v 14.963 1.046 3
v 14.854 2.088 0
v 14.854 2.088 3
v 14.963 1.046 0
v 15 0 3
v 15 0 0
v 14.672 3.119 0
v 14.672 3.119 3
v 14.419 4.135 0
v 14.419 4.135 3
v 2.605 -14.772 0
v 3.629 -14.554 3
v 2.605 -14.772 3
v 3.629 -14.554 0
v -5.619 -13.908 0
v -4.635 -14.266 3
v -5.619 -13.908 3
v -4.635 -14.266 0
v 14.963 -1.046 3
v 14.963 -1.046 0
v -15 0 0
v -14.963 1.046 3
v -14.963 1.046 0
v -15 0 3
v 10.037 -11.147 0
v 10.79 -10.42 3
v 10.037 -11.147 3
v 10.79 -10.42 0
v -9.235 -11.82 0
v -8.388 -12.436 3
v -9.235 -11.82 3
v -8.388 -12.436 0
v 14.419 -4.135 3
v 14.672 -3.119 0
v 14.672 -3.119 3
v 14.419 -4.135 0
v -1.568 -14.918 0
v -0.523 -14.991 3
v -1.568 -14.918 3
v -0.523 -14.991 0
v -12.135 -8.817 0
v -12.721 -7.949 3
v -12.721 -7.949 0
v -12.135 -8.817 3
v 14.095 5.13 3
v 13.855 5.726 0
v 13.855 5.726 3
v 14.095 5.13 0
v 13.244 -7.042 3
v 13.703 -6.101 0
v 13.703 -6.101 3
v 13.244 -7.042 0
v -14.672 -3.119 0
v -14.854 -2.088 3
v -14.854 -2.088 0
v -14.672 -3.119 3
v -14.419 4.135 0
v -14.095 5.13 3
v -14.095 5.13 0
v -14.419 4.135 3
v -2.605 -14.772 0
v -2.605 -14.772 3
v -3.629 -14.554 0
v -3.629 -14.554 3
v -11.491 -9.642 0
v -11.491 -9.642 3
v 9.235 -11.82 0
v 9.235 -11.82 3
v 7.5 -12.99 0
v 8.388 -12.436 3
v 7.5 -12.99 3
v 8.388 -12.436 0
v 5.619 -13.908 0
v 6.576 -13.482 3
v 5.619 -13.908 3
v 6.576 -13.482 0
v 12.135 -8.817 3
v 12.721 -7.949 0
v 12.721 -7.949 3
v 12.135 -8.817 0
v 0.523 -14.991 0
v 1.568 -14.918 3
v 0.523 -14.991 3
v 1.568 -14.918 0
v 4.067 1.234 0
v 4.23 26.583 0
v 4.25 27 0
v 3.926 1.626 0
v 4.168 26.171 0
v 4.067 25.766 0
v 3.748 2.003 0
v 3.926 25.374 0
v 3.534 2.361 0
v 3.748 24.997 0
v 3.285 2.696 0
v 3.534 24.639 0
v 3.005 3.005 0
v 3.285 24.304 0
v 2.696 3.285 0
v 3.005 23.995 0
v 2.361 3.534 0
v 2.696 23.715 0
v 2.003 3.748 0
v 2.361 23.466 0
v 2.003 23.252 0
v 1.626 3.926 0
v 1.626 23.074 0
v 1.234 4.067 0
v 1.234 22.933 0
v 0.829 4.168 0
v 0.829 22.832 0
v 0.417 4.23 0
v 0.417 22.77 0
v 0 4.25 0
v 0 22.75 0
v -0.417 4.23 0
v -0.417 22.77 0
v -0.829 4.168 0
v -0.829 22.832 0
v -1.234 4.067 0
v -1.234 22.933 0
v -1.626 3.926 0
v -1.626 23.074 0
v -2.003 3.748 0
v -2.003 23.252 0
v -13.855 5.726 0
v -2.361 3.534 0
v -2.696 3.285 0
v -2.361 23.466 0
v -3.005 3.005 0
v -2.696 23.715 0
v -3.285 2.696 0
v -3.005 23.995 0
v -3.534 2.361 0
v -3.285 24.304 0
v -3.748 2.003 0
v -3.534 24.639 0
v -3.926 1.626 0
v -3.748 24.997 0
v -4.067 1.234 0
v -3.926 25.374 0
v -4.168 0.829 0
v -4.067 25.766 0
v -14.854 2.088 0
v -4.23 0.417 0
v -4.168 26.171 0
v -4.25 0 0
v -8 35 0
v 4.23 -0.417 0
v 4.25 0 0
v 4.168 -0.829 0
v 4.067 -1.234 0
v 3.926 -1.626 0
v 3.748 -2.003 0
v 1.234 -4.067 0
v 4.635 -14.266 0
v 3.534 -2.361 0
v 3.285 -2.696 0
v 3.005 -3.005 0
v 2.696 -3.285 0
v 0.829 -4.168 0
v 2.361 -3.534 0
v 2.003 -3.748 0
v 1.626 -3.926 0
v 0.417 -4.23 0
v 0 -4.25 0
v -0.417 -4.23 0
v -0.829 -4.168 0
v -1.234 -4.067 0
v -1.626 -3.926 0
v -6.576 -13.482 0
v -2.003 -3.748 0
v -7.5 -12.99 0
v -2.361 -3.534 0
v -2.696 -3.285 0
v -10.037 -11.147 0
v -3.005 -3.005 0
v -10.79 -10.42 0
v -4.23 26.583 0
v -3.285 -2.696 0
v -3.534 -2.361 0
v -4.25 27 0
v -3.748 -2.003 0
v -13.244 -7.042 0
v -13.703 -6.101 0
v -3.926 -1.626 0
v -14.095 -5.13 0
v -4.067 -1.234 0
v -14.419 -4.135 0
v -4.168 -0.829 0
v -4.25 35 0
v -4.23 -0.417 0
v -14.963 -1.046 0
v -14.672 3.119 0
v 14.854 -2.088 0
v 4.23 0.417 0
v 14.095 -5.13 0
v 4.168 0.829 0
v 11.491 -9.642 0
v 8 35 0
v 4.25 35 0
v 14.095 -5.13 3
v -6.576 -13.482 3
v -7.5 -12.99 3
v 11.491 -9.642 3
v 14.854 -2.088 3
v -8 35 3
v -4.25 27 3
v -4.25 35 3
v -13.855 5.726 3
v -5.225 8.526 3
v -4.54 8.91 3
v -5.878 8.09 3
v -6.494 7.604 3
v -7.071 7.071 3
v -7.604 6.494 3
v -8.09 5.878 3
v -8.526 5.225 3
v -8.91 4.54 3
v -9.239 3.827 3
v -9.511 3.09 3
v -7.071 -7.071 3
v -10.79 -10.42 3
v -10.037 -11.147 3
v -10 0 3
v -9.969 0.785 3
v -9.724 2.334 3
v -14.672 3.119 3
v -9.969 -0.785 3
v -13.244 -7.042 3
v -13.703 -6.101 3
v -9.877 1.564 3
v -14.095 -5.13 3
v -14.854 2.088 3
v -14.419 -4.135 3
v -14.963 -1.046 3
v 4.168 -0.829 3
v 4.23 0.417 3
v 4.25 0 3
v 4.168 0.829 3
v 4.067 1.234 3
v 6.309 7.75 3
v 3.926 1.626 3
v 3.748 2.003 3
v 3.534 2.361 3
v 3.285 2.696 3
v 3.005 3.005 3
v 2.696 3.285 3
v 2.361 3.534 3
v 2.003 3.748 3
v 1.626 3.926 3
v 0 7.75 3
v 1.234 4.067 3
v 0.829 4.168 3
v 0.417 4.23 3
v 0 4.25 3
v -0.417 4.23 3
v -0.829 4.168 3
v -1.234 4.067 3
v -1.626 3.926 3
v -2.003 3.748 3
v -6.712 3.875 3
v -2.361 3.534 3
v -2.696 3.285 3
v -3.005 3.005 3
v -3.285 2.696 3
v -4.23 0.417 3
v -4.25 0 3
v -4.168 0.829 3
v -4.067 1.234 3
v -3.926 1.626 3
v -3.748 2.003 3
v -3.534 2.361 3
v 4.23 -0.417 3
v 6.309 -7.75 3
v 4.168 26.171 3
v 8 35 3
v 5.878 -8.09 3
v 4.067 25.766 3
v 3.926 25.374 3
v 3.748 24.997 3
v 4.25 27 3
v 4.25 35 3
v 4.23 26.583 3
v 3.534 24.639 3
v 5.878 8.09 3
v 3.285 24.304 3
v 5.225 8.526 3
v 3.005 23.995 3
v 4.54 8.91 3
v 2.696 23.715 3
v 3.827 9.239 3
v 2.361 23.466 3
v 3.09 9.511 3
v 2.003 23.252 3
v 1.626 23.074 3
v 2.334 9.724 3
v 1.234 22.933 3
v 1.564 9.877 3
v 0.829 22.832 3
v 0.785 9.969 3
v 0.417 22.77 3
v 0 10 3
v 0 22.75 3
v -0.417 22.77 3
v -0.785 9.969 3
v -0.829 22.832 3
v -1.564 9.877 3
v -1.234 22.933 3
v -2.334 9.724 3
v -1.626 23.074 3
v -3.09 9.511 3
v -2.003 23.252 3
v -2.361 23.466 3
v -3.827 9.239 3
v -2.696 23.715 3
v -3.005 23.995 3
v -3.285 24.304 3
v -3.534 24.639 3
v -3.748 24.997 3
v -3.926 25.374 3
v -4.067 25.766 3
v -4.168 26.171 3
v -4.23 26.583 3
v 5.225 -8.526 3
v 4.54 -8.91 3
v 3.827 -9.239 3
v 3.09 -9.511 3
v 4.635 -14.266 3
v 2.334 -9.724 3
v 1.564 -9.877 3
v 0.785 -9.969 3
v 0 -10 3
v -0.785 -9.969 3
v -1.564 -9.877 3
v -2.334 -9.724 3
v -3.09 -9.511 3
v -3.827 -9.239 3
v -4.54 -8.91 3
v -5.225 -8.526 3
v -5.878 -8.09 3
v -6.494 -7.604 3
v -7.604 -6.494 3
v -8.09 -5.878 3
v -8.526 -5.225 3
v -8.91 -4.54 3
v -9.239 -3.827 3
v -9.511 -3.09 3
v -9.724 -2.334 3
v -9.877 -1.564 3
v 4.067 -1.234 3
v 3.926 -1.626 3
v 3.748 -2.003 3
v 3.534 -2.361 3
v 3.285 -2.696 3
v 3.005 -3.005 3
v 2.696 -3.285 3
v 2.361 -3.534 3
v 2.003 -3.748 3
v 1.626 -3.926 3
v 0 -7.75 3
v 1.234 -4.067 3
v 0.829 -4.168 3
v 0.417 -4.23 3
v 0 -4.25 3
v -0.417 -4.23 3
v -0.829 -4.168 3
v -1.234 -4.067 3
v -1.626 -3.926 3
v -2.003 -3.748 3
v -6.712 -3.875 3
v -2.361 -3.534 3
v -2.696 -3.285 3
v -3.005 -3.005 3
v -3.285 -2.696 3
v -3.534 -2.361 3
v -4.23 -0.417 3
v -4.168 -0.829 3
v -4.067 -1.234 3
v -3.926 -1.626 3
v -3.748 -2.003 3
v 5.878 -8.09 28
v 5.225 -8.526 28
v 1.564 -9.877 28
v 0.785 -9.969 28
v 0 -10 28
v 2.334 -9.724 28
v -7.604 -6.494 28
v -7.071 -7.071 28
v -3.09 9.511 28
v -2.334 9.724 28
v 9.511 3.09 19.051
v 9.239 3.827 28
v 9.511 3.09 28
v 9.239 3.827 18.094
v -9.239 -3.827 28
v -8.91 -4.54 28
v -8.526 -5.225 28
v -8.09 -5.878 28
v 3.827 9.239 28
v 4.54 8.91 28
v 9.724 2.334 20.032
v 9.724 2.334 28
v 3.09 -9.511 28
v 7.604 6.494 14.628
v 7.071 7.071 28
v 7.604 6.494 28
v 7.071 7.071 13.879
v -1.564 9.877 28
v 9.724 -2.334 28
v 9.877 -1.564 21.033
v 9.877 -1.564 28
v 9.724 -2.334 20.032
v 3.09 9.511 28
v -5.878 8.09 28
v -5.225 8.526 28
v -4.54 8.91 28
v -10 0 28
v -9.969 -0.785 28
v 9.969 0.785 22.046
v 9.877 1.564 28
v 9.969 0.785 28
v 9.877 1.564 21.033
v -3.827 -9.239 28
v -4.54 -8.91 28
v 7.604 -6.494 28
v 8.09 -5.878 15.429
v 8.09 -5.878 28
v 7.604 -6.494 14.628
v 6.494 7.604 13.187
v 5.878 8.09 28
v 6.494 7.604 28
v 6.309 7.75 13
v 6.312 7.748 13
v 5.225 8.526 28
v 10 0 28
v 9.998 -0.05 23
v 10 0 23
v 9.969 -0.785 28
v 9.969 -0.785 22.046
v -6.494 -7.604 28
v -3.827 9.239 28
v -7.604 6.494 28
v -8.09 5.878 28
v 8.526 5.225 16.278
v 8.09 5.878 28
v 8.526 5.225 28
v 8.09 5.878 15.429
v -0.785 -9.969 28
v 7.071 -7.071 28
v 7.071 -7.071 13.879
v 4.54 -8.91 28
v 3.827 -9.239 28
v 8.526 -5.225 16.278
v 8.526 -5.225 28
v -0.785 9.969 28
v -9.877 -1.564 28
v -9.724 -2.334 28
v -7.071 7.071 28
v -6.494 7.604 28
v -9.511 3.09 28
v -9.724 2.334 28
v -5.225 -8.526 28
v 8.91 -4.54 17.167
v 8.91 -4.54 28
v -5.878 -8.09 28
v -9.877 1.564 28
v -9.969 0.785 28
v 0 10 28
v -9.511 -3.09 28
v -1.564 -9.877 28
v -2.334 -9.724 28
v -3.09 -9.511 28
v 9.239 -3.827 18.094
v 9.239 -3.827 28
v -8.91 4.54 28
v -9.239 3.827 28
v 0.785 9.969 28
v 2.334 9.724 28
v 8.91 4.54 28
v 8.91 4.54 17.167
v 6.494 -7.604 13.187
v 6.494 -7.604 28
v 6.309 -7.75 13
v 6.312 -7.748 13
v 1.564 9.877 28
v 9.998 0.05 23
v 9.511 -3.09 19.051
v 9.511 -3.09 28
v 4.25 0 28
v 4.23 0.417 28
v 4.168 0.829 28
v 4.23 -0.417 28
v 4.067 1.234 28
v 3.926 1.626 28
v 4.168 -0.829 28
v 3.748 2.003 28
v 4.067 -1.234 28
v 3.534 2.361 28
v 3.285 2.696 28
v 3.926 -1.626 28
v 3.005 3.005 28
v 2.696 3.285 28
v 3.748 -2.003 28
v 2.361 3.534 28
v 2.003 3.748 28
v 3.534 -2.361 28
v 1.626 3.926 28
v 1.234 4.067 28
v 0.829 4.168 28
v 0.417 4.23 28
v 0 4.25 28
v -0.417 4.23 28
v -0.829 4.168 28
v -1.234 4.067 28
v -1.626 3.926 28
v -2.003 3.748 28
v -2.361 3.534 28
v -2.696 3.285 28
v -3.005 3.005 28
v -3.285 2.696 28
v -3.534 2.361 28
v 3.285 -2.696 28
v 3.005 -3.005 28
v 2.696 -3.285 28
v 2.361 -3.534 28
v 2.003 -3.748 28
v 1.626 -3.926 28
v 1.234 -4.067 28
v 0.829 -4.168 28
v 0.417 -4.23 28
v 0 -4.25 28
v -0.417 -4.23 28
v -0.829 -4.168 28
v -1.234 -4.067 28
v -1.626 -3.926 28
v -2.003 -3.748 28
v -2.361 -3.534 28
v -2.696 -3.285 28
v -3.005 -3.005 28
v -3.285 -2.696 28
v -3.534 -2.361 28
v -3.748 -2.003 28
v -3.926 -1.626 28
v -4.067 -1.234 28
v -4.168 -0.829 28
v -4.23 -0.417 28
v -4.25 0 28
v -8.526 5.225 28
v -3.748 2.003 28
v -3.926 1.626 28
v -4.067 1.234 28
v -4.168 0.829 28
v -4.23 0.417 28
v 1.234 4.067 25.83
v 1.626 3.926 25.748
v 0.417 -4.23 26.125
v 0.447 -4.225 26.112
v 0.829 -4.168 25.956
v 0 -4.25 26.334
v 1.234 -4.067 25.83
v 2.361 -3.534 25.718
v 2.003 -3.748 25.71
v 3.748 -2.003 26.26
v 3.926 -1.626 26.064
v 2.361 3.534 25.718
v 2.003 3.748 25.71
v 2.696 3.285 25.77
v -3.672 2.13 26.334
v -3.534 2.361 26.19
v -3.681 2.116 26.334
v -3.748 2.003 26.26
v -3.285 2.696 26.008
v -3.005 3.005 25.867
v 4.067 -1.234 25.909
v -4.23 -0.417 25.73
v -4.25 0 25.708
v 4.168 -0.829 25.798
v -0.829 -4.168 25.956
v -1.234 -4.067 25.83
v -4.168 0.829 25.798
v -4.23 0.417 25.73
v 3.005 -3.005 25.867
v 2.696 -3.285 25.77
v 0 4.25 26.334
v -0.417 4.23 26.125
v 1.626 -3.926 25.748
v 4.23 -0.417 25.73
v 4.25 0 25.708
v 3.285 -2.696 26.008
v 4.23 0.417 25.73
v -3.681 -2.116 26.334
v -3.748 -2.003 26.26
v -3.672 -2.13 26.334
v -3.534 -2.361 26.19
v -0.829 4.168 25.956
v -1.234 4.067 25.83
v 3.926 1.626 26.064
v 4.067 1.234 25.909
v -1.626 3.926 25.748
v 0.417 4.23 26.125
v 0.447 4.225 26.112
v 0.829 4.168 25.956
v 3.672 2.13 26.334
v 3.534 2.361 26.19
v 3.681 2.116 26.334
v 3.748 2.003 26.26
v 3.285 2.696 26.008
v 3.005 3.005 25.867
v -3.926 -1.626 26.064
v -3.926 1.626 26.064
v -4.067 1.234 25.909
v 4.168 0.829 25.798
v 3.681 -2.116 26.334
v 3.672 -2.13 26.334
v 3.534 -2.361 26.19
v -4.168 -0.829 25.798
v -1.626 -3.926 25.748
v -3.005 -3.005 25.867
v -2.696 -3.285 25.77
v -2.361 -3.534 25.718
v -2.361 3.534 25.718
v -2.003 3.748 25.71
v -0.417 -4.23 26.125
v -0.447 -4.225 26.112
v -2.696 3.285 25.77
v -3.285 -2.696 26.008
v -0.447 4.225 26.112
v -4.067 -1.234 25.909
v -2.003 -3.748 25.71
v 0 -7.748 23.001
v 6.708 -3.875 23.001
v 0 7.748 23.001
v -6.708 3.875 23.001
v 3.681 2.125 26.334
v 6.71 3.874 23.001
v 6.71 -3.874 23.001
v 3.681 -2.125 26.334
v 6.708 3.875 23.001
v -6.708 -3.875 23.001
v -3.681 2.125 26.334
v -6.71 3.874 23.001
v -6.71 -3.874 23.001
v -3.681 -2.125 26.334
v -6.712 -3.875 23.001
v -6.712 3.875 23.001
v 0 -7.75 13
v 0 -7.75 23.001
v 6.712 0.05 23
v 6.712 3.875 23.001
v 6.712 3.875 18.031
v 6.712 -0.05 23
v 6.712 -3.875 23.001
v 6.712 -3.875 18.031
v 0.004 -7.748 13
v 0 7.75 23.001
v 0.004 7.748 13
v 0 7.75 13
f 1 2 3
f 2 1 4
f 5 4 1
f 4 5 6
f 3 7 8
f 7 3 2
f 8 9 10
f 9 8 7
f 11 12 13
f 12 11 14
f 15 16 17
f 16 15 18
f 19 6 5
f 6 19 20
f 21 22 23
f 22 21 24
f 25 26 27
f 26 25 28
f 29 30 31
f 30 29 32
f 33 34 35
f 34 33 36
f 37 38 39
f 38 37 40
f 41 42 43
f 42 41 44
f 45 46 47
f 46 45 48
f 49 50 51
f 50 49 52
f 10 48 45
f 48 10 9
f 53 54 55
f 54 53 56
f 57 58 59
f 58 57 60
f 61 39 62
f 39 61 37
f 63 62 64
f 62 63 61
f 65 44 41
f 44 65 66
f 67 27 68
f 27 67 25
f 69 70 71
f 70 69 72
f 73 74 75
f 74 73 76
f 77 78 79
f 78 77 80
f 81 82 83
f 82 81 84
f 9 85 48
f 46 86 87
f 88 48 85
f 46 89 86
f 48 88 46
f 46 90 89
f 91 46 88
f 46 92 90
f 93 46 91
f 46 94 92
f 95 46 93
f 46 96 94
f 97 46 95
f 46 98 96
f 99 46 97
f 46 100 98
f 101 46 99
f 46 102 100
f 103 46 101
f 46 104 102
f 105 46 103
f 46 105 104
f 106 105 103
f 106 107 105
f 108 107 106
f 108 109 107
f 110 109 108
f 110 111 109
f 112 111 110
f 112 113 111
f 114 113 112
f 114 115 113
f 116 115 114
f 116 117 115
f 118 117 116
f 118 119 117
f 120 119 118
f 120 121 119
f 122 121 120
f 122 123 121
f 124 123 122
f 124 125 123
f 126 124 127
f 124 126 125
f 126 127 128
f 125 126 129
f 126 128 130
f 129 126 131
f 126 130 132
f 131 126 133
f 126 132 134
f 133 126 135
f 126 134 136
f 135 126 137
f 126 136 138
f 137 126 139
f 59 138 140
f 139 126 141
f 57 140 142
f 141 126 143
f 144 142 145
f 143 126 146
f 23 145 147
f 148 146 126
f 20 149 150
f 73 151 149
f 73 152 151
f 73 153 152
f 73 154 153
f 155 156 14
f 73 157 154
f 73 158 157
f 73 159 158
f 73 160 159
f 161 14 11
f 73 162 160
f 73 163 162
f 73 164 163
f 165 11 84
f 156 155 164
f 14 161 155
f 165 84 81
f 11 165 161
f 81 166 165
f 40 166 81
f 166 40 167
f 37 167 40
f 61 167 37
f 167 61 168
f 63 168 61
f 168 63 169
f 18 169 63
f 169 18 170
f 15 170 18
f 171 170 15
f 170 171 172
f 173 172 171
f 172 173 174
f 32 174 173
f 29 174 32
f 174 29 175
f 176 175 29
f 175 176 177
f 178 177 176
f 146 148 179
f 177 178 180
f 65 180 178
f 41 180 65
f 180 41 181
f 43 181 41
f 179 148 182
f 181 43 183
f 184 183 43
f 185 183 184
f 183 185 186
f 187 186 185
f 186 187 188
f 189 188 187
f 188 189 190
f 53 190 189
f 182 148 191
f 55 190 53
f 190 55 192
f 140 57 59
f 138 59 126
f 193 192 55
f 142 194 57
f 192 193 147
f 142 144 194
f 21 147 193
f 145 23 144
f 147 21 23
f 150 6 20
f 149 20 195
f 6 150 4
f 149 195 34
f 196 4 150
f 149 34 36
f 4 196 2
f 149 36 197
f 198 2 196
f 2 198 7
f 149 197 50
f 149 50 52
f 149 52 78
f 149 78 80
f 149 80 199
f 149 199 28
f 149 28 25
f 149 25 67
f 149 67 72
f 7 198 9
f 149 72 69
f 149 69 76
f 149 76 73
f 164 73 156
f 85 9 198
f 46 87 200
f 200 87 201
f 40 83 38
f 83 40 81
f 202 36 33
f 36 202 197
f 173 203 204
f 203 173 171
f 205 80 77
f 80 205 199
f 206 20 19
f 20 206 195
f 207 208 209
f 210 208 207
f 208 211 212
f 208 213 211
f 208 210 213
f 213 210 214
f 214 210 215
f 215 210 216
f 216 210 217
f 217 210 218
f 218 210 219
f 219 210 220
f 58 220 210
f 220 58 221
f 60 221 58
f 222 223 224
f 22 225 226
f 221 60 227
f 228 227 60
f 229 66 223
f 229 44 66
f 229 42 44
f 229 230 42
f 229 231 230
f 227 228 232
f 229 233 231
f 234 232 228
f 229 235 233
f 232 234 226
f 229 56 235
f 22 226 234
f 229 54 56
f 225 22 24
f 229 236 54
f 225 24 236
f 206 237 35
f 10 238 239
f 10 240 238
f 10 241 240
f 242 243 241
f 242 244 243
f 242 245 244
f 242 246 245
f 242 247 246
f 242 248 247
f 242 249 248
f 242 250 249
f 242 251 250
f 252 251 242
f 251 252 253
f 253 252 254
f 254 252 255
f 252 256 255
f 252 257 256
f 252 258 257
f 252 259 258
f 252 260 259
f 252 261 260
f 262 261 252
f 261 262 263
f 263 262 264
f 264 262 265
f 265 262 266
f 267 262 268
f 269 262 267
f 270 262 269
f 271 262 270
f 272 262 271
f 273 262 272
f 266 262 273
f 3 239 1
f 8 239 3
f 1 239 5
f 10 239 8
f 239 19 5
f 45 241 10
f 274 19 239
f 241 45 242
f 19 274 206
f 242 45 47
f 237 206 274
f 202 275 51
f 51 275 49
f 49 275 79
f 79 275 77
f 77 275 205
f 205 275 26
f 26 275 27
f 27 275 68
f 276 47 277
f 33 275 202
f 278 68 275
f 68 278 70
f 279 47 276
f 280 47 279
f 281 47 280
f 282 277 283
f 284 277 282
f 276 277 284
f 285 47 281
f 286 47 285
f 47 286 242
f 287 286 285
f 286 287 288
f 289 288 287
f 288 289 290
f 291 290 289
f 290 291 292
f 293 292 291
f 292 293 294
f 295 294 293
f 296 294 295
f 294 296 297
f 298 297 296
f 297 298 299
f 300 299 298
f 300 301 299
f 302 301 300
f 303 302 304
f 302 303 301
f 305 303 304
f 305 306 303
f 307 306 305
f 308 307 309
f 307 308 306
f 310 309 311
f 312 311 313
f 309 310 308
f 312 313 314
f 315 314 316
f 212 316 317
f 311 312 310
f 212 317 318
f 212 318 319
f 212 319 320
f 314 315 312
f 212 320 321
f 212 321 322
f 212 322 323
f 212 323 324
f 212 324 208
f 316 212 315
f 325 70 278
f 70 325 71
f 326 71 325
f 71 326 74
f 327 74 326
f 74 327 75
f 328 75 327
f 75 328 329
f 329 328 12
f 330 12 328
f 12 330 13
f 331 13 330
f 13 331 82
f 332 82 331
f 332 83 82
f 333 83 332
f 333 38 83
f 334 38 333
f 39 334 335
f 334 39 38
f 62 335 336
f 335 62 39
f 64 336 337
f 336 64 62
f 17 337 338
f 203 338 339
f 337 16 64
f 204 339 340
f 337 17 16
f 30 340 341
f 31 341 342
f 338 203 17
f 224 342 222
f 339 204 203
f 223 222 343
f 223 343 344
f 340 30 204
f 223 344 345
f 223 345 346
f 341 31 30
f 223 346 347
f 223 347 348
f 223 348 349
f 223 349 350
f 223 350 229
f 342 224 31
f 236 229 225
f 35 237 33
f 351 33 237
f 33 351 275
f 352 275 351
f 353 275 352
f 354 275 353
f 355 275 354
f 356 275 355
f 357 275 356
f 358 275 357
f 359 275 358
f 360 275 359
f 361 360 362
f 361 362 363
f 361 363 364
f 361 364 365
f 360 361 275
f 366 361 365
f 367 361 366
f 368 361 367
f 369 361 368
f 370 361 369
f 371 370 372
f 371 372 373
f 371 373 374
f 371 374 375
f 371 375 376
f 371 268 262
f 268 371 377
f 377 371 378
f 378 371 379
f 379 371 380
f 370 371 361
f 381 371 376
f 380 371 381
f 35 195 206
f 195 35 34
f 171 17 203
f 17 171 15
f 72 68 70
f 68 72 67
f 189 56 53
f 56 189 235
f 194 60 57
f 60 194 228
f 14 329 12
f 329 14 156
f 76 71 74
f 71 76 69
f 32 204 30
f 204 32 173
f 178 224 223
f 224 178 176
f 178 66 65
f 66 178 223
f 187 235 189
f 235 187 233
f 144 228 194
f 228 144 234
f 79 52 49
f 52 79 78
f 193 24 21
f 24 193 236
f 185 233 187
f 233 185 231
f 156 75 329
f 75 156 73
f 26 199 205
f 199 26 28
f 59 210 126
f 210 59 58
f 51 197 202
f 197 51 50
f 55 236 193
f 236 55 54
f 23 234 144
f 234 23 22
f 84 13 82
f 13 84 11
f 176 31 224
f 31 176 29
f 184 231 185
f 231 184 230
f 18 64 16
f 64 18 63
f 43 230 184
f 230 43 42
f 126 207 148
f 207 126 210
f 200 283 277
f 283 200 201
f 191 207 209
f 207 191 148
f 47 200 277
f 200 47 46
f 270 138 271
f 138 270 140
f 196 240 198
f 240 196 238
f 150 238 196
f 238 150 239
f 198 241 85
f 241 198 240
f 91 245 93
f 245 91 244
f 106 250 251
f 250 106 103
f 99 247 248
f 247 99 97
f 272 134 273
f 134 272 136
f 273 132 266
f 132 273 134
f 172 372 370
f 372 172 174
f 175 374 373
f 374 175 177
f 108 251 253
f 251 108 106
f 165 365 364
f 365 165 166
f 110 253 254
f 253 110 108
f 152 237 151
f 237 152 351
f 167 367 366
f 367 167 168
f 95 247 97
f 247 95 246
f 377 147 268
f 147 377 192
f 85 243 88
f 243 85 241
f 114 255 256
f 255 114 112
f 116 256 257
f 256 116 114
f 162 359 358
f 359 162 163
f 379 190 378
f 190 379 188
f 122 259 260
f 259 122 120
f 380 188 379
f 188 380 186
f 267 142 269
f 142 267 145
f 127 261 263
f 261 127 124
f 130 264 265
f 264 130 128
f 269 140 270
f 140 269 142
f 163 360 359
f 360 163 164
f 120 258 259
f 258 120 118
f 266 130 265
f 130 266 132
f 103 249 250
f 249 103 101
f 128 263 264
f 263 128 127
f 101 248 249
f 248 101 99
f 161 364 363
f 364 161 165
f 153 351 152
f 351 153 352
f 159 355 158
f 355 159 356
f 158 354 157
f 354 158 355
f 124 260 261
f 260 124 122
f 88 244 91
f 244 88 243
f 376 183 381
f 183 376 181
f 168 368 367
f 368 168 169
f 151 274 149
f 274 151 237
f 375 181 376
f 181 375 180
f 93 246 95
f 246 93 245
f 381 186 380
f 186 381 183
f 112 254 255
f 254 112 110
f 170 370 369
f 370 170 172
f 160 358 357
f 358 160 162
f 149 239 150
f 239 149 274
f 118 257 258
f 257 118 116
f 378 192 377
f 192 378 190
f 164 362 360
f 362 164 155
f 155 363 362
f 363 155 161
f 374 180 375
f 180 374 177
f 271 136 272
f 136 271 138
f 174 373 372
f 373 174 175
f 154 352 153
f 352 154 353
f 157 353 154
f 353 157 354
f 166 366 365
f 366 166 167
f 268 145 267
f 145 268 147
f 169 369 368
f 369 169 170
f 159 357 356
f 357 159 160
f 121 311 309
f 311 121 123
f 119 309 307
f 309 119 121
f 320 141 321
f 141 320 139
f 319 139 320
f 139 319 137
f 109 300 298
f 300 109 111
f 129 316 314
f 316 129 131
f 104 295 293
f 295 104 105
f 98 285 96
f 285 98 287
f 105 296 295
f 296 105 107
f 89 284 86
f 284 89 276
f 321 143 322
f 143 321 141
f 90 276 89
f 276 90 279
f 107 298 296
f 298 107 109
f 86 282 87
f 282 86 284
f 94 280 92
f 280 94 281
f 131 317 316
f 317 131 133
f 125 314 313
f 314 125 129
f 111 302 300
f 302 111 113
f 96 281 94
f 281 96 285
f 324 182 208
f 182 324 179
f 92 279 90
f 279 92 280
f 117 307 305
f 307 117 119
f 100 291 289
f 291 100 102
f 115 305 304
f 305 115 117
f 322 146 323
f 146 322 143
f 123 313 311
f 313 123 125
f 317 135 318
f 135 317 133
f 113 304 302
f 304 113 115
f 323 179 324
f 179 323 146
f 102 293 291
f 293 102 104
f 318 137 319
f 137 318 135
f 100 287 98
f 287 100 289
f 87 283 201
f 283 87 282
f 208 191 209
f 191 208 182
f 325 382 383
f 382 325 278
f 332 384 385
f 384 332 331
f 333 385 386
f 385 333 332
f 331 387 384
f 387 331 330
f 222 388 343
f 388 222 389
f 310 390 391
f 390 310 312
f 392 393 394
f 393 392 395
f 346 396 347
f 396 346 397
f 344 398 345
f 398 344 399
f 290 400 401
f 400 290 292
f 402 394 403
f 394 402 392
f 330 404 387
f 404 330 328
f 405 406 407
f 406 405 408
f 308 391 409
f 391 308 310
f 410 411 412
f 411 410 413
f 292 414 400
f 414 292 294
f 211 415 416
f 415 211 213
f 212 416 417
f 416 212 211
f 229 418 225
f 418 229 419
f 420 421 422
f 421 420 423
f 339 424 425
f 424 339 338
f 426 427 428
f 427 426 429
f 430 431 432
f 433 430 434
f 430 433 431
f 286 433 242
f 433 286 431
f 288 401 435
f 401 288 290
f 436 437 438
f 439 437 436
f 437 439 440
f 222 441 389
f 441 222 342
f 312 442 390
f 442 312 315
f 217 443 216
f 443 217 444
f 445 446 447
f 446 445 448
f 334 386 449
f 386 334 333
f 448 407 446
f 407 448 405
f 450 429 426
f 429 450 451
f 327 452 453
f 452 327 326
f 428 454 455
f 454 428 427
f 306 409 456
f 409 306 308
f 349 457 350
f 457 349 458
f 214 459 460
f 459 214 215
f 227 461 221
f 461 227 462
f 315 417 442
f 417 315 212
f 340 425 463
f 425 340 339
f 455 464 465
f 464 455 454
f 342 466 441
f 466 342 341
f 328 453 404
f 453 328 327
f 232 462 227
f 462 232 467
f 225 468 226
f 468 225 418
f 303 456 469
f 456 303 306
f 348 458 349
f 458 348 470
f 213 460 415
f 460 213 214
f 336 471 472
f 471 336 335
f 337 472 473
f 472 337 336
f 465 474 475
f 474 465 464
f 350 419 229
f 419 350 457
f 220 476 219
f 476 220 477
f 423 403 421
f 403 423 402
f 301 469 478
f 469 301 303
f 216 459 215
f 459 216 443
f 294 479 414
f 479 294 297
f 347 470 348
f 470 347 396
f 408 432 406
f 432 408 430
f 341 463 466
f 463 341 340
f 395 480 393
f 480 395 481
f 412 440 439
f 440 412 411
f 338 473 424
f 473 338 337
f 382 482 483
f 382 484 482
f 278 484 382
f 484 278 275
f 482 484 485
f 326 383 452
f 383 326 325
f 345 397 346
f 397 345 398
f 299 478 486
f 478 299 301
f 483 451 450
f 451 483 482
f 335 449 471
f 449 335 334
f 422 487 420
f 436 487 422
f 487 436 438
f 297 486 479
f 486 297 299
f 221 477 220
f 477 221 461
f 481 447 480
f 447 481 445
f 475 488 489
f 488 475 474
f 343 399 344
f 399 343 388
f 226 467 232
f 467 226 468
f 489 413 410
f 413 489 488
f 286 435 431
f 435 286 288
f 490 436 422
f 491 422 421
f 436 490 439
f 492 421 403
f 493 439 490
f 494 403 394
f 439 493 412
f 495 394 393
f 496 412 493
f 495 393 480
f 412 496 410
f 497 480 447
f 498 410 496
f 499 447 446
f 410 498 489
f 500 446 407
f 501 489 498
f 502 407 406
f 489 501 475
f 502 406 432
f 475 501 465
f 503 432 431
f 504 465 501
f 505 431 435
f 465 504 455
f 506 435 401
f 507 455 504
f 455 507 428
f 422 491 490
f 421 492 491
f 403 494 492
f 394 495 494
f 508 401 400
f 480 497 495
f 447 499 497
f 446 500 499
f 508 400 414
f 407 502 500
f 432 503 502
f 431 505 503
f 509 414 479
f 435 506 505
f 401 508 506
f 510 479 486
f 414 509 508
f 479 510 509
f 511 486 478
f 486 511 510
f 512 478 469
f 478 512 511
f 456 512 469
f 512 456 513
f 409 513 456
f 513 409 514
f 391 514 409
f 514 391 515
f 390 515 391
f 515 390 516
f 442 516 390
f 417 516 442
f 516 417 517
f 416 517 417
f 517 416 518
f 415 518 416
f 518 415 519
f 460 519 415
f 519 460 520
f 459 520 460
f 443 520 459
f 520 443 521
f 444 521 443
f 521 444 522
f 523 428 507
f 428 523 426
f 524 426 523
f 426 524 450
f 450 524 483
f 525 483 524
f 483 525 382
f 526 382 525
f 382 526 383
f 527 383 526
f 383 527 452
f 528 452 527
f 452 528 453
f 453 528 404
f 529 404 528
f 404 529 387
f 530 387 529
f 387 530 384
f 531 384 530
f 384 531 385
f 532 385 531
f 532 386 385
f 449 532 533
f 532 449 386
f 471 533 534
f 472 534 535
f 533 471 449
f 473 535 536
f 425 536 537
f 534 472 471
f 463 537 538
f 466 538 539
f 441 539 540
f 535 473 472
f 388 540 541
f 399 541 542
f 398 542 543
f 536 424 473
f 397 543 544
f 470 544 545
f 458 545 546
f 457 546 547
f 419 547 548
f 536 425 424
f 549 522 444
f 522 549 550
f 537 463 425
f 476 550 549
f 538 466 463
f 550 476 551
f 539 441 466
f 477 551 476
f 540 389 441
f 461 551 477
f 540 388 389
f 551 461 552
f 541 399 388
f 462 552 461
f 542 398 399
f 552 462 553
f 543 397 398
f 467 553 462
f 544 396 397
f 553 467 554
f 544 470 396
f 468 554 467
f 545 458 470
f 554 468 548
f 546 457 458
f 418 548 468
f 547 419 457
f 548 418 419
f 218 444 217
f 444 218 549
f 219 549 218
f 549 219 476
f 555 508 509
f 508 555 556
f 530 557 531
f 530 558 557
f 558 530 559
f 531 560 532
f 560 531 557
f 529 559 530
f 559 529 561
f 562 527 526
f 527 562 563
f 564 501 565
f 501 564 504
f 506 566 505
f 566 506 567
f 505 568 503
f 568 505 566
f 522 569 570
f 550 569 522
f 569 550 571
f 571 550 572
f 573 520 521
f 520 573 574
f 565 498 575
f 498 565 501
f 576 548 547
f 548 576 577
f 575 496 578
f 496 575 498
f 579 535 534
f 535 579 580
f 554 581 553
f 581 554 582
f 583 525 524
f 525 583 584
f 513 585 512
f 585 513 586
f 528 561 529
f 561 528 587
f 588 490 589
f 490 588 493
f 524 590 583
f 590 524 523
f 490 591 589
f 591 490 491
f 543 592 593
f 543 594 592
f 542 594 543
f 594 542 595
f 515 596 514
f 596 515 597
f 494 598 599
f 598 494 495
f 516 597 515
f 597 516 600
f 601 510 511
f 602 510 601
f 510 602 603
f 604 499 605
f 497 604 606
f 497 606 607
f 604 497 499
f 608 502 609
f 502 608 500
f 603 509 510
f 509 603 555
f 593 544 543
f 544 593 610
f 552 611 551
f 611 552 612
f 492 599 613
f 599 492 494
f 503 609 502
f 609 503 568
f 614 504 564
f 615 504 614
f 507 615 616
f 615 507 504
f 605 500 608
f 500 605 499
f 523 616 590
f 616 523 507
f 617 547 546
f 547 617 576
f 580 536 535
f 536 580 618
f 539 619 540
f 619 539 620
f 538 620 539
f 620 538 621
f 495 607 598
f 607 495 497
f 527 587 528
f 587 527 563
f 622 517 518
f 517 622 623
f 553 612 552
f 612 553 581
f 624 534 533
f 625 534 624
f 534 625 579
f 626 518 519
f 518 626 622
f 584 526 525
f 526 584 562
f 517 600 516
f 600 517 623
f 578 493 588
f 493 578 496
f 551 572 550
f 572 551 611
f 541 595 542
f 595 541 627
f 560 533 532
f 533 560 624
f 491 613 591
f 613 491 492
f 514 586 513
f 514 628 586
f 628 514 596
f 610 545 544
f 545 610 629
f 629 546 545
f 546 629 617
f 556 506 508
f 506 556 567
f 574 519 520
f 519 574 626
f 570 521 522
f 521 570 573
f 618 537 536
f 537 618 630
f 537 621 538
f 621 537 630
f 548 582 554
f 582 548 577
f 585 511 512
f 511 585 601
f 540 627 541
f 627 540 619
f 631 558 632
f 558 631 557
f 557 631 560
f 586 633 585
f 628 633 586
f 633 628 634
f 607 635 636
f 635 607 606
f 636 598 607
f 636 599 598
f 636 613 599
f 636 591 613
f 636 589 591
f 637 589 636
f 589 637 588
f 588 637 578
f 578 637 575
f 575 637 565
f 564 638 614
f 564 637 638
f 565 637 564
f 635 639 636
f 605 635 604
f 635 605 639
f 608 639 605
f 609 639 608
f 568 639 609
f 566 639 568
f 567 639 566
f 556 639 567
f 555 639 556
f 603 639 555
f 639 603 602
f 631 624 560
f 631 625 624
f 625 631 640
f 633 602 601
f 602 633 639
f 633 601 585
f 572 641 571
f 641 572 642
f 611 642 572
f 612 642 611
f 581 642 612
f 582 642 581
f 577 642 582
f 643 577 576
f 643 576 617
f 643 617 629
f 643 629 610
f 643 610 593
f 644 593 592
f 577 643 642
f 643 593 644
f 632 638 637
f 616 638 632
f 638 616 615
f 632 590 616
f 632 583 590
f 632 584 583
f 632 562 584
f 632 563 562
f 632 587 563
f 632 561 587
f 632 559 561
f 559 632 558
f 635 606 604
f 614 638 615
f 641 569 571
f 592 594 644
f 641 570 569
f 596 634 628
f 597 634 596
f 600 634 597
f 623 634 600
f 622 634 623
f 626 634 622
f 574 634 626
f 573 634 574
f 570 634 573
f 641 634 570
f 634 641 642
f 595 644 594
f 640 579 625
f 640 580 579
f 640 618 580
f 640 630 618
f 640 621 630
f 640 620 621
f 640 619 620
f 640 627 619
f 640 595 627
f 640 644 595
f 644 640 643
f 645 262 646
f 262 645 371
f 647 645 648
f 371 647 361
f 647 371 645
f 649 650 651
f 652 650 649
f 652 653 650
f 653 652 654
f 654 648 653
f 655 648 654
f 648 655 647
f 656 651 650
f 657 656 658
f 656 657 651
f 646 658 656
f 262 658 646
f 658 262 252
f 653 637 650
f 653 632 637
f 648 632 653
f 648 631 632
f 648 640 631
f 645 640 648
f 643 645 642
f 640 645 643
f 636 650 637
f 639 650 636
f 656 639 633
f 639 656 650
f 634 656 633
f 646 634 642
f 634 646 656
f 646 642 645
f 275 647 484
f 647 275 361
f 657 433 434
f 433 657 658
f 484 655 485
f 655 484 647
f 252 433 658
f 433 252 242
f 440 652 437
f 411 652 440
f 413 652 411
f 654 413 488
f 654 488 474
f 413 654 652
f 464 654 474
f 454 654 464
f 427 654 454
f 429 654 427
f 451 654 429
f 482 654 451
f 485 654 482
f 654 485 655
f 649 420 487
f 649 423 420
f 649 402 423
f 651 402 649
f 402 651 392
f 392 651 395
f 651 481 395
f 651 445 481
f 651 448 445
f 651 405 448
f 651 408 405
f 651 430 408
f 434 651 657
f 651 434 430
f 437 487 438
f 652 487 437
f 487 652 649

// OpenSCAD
/* [General] */
// Tolerance for inner diameters
tolerance = 0.5;

/* [Threaded rod] */
// Rod diameter
rodDiameter = 8.0;
// Nut diameter
rodNutDiameter = 15.0;

/* [Guide/smooth rod] */
// Rod diameter
guideDiameter = 8.0;
// Distance to the threaded rod
guideDistance = 27.0;

/* [Base part] */
// Diameter
baseOuterDiameter = 30.0;
// Width of the tip
baseTipWidth = 16.0;
// Length of the tip
baseTipLength = 35.0;
// Height
baseHeight = 3.0;

/* [Container part] */
// Outer diamter of the cylinder
tensionerOuterDiameter = 20.0;
// Overall height
tensionerHeight = 25.0;
// Roof height
tensionerRoofHeight = 5.0;

mainPart();

module mainPart() {
    union() {
        basePart(baseOuterDiameter, baseHeight, baseTipWidth, baseTipLength, rodDiameter + tolerance, guideDiameter + tolerance, guideDistance);
        
        translate([0,0,baseHeight - 0.001])
        rotate([0, 0, -90])
            tensionPart(tensionerOuterDiameter, tensionerHeight + 0.001, tensionerRoofHeight, rodDiameter + tolerance, rodNutDiameter + tolerance);
    }
}

module basePart(baseOuterDiameter = baseOuterDiameter, baseHeight = baseHeight, baseTipWidth = baseTipWidth, baseTipLength = baseTipLength, rodDiameter = rodDiameter, guideDiameter = guideDiameter, guideDistance = guideDistance) {
    
    rodRadius = rodDiameter / 2;
    baseOuterRadius = baseOuterDiameter / 2;
    guideRadius = guideDiameter / 2;
    
    difference() {
        // Create base shape
        union() {
            cylinder(h = baseHeight, r1 = baseOuterRadius, r2 = baseOuterRadius, $fn = 90);
            
            translate([0,baseTipLength/2,0])
            trapezoid(w1 = baseOuterDiameter, w2 = baseTipWidth, h = baseHeight, d = baseTipLength);
        }
        
        // Cut out hole for rod
        translate([0,0,-0.5])
            cylinder(h = baseHeight + 1, r1 = rodRadius, r2 = rodRadius, $fn = 64);
        
        // Cut out hole for guide
        translate([0,guideDistance,-0.001])
            cylinder(h = baseHeight + 0.002, r1 = guideRadius, r2 = guideRadius, $fn = 64);
        translate([0,guideDistance + baseTipLength / 2,-0.001])
            box(guideDiameter, baseTipLength, baseHeight + 0.002);
    }
}

module tensionPart(tensionerOuterDiameter = tensionerOuterDiameter, tensionerHeight = tensionerHeight, tensionerRoofHeight = tensionerRoofHeight, rodDiameter = rodDiameter, rodNutDiameter = rodNutDiameter) {
    
    rodRadius = rodDiameter / 2;
    nutInlayHeight = tensionerHeight - tensionerRoofHeight;
    nutRadius = rodNutDiameter / 2;
    tensionerOuterRadius = tensionerOuterDiameter / 2;
    
    difference() {            
        cylinder(h = tensionerHeight, r1 = tensionerOuterDiameter / 2, r2 = tensionerOuterDiameter / 2, $fn = 80);
        
        // Cut out hole for rod
        translate([0,0,nutInlayHeight-0.001])
            cylinder(h = tensionerRoofHeight + 0.002, r1 = rodRadius, r2 = rodRadius, $fn = 64);
        translate([0,0,nutInlayHeight-0.001])
            cylinder(h = tensionerRoofHeight / 3 * 2 + 0.002, r1 = nutRadius, r2 = rodRadius, $fn = 6);
        
        // Cut out hole for the nut
        translate([0, 0, -0.001])
            cylinder(h=nutInlayHeight + 0.002, r1=nutRadius, r2=nutRadius, $fn = 6);
        translate([0, tensionerOuterRadius, -0.001])
            box(rodNutDiameter, tensionerOuterDiameter, nutInlayHeight / 2 + 0.002);
            
        rotate([90, 0, 0])
        translate([0, nutInlayHeight * 0.75 - 0.001, -tensionerOuterRadius])
            trapezoid(w1 = rodNutDiameter, w2 = 0.1, h = tensionerOuterRadius, d = nutInlayHeight / 2 + 0.002);
    }
}

/* 2d shapes */

module triangle(radius)
{
  o=radius/2; //equivalent to radius*sin(30)
  a=radius*sqrt(3)/2; //equivalent to radius*cos(30)
  polygon(points=[[-a,-o],[0,radius],[a,-o]],paths=[[0,1,2]]);
}

module rectangle(width, depth)
{
    polygon(points=[[-width/2,-depth/2],[width/2,-depth/2],[width/2,depth/2],[-width/2,depth/2]],paths=[[0,1,2,3]]);
}

/*
 * 3d shapes
 */

module box(width, depth, height)
{
    linear_extrude(height=height) 
        rectangle(width, depth);
}

module trapezoid(w1, w2, h, d) {
    linear_extrude(height=h) 
        polygon(points=[[-w1/2,-d/2],[w1/2,-d/2],[w2/2,d/2],[-w2/2,d/2]],paths=[[0,1,2,3]]);
}
